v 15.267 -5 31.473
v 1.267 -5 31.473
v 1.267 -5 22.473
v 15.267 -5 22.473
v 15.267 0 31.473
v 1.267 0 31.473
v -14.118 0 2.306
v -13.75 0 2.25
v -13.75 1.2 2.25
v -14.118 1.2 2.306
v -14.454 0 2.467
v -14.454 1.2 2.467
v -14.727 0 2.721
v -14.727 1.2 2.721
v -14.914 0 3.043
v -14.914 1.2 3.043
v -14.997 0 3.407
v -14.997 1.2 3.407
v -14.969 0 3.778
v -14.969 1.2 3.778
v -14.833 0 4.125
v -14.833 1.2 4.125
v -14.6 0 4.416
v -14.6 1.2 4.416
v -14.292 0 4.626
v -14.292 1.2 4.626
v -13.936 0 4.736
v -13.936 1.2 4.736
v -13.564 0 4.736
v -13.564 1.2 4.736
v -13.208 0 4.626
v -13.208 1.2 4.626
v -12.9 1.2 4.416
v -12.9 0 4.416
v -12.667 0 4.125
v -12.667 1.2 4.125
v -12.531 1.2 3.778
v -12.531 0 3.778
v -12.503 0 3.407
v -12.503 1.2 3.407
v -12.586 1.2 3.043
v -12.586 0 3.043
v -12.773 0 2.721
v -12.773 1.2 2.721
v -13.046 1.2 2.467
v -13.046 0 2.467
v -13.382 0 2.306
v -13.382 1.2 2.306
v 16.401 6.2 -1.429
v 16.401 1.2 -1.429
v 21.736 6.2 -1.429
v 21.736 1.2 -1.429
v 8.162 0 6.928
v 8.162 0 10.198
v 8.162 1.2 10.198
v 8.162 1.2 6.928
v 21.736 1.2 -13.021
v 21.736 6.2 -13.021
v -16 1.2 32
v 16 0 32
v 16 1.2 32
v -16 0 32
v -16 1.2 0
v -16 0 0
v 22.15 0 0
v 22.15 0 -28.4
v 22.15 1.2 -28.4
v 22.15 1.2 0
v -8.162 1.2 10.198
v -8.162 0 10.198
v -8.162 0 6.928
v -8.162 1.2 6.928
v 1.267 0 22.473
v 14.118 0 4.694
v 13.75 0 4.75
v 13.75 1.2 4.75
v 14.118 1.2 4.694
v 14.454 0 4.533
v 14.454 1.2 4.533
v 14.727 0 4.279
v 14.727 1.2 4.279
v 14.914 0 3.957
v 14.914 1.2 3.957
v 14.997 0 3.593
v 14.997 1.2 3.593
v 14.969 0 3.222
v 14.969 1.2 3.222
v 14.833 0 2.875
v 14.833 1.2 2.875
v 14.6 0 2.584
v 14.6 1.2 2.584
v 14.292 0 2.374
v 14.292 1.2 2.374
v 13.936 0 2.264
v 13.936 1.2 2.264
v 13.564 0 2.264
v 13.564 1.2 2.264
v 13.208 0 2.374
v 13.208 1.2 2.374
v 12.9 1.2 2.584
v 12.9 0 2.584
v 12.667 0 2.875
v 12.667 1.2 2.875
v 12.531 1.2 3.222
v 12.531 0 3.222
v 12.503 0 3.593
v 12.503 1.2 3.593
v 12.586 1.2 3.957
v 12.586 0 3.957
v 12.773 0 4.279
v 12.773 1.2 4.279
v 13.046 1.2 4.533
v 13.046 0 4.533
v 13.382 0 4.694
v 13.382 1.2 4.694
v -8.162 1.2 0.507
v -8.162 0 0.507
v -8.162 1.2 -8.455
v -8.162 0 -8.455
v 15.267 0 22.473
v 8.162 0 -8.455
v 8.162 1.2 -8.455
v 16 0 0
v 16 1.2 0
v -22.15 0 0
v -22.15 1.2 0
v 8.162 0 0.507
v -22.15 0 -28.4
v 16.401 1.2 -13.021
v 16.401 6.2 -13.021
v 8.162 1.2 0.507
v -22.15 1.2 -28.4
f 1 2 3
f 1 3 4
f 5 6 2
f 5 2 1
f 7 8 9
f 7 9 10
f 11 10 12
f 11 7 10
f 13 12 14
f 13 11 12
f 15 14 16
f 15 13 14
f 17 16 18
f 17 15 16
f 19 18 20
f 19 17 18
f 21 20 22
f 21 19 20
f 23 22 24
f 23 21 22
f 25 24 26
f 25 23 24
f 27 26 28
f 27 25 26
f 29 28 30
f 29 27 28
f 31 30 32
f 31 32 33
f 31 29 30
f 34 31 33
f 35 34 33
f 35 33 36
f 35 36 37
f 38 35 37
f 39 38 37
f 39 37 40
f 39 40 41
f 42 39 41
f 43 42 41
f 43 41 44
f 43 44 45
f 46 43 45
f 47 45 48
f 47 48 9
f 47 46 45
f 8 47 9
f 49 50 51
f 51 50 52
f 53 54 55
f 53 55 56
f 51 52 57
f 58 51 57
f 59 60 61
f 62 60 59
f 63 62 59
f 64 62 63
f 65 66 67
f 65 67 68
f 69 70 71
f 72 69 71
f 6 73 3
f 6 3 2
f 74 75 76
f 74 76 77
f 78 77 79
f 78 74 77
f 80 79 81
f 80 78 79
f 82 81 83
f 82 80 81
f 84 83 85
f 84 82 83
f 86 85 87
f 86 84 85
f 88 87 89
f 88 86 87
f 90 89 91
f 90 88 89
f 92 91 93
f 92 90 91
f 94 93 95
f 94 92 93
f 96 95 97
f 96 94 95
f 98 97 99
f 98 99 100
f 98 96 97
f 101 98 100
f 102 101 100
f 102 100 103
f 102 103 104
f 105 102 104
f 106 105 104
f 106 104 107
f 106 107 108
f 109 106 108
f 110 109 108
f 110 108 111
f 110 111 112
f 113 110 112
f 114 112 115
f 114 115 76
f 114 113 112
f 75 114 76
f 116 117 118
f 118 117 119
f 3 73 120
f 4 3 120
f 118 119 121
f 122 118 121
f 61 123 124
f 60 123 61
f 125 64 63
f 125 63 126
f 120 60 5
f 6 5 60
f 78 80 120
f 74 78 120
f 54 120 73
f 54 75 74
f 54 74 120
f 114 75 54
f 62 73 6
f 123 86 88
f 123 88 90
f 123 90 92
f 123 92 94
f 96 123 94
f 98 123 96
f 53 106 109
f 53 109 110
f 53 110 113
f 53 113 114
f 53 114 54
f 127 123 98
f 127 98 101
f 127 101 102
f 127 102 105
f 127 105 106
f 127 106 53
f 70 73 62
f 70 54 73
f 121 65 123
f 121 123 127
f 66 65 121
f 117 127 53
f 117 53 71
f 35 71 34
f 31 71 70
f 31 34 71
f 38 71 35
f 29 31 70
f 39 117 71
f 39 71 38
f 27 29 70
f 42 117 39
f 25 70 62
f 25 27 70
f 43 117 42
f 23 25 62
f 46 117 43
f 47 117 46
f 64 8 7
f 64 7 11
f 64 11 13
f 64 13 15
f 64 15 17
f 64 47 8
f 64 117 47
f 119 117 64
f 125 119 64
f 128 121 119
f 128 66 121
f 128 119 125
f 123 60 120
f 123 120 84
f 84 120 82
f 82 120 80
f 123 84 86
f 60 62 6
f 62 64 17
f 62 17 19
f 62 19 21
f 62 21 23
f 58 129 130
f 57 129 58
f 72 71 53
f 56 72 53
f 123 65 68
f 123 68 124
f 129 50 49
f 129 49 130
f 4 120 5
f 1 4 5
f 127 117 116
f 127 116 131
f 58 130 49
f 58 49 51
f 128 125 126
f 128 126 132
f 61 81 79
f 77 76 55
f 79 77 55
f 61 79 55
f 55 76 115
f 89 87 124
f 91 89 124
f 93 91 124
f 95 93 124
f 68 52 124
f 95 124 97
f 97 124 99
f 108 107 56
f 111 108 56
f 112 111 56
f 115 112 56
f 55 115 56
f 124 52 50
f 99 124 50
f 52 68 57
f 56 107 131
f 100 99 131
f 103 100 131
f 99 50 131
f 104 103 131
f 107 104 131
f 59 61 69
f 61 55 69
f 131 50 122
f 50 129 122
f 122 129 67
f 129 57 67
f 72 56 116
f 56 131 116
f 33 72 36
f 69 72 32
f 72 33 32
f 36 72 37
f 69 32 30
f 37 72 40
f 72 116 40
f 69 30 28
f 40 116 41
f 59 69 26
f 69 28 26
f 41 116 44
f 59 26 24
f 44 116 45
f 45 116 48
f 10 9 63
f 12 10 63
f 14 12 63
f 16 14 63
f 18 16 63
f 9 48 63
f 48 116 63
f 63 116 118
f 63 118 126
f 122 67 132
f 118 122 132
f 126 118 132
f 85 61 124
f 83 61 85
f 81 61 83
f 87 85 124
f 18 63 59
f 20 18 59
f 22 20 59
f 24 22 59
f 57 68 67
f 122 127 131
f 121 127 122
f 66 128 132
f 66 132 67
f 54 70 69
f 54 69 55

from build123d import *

# Parameters (mm, degrees)
SKETCH_1_R      = 1.25
SKETCH_1_W      = 16.323541982
SKETCH_1_H      = 8.961255986
SKETCH_1_H_2    = 3.269836796
EXTRUDE_1_DEPTH = 1.2
SKETCH_2_W      = 5.33414326
SKETCH_2_H      = 11.592185383
EXTRUDE_2_DEPTH = 5
SKETCH_3_W      = 14
SKETCH_3_H      = 9
EXTRUDE_3_DEPTH = 5


with BuildPart() as part:
    # 草图1 → 凸台-拉伸1 (new body)
    with BuildSketch(Plane(origin=(0, 0, 0), x_dir=(1, 0, 0), z_dir=(0, 1, 0))):
        Polygon((16, 0), (16, -32), (-16, -32), (-16, 0), (-22.15, 0), (-22.15, 28.4), (22.15, 28.4), (22.15, 0), align=None)
        with Locations(Location((13.75, -3.5, 0), (0, 0, 270))):
            Circle(SKETCH_1_R, mode=Mode.SUBTRACT)
        with Locations(Location((-13.75, -3.5, 0), (0, 0, 90))):
            Circle(SKETCH_1_R, mode=Mode.SUBTRACT)
        with Locations((0, 3.973903908)):
            Rectangle(SKETCH_1_W, SKETCH_1_H, mode=Mode.SUBTRACT)
        with Locations((0, -8.562744205)):
            Rectangle(SKETCH_1_W, SKETCH_1_H_2, mode=Mode.SUBTRACT)
    extrude(amount=EXTRUDE_1_DEPTH)

    # 草图2 → 凸台-拉伸2 (add)
    with BuildSketch(Plane(origin=(0, 1.2, 0), x_dir=(1, 0, 0), z_dir=(0, 1, 0))):
        with Locations((19.068534732, 7.22523066)):
            Rectangle(SKETCH_2_W, SKETCH_2_H)
    extrude(amount=EXTRUDE_2_DEPTH)

    # 草图3 → 凸台-拉伸3 (add)
    with BuildSketch(Plane.XZ):
        with Locations((8.26747858, 26.972724501)):
            Rectangle(SKETCH_3_W, SKETCH_3_H)
    extrude(amount=EXTRUDE_3_DEPTH)


solid = part.part
